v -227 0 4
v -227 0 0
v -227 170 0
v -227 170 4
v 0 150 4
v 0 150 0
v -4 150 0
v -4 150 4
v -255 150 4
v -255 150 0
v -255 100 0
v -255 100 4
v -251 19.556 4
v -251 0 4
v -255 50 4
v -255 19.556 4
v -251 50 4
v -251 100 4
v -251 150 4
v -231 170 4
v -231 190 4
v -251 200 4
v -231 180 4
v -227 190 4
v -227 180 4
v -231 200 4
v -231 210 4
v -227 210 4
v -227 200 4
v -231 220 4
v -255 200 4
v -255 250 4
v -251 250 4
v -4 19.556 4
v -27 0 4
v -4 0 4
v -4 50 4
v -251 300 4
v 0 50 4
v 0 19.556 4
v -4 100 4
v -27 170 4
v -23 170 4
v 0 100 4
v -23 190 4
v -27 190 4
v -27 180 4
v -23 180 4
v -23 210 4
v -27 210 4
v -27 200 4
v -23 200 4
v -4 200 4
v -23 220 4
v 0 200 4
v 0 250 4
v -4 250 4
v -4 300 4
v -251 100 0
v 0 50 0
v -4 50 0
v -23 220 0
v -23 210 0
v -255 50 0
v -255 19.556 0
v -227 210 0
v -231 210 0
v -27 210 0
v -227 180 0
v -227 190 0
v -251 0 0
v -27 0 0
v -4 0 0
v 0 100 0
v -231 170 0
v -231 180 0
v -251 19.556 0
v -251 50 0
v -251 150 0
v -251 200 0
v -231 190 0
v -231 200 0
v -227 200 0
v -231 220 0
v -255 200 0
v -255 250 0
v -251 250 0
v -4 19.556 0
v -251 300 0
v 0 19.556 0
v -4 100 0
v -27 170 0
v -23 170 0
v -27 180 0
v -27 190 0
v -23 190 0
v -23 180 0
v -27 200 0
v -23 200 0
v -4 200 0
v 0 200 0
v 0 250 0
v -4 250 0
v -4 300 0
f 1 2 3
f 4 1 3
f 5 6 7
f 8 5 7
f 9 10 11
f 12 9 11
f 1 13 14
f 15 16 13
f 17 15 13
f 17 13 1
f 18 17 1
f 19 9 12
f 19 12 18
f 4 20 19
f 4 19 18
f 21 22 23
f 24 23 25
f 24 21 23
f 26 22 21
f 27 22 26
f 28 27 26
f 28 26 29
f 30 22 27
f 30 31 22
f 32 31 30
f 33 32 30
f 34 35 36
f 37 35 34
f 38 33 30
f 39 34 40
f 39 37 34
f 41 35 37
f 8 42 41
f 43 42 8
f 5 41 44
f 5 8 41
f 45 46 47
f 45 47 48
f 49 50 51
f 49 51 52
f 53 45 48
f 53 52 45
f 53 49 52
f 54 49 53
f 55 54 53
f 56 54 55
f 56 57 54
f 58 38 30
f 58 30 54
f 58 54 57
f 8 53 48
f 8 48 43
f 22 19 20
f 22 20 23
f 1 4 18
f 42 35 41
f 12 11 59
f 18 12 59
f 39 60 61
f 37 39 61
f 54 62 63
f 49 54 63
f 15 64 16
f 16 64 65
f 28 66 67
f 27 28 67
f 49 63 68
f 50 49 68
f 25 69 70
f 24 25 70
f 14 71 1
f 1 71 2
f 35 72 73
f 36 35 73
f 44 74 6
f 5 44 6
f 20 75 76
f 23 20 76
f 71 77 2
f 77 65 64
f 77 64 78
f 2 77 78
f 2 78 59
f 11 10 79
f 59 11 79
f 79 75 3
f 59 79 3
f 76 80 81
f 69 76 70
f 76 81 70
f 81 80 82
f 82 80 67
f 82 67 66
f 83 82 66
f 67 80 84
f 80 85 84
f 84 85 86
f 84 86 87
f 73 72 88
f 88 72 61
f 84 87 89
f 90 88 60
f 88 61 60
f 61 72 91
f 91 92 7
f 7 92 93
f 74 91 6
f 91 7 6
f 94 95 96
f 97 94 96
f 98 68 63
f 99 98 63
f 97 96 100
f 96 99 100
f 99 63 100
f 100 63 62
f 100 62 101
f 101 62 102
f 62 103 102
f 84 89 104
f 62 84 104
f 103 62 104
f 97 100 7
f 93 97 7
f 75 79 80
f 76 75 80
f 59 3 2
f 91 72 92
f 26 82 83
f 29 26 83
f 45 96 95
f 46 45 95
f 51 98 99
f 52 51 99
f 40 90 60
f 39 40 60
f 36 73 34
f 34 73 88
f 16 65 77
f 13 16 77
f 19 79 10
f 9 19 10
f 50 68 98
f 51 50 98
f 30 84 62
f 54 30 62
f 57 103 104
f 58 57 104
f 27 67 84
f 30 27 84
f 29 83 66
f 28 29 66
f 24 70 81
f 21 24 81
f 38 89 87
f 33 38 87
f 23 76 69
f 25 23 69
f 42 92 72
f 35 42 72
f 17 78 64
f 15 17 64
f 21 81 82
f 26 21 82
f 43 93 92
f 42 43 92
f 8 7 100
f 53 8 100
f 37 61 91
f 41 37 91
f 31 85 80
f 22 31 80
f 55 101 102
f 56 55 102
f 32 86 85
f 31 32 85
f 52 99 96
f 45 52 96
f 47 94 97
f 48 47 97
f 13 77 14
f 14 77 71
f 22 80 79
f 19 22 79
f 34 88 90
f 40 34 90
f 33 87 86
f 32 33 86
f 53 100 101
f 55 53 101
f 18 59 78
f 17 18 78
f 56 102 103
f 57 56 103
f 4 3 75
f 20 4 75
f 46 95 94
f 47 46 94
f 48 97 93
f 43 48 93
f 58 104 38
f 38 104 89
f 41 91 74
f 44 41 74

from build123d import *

# Parameters (mm, degrees)
F1_DEPTH = 4


with BuildPart() as f1:
    # F0 (on Top) → F1 (new body)
    with BuildSketch(Plane.XY):
        Polygon((-27, 0), (-4, 0), (-4, 19.556), (0, 19.556), (0, 50), (-4, 50), (-4, 100), (0, 100), (0, 150), (-4, 150), (-4, 200), (0, 200), (0, 250), (-4, 250), (-4, 300), (-251, 300), (-251, 250), (-255, 250), (-255, 200), (-251, 200), (-251, 150), (-255, 150), (-255, 100), (-251, 100), (-251, 50), (-255, 50), (-255, 19.556), (-251, 19.556), (-251, 0), (-227, 0), (-227, 170), (-231, 170), (-231, 180), (-227, 180), (-227, 190), (-231, 190), (-231, 200), (-227, 200), (-227, 210), (-231, 210), (-231, 220), (-227, 220), (-27, 220), (-23, 220), (-23, 210), (-27, 210), (-27, 200), (-23, 200), (-23, 190), (-27, 190), (-27, 180), (-23, 180), (-23, 170), (-27, 170), align=None)
    extrude(amount=F1_DEPTH)


solid = f1.part
